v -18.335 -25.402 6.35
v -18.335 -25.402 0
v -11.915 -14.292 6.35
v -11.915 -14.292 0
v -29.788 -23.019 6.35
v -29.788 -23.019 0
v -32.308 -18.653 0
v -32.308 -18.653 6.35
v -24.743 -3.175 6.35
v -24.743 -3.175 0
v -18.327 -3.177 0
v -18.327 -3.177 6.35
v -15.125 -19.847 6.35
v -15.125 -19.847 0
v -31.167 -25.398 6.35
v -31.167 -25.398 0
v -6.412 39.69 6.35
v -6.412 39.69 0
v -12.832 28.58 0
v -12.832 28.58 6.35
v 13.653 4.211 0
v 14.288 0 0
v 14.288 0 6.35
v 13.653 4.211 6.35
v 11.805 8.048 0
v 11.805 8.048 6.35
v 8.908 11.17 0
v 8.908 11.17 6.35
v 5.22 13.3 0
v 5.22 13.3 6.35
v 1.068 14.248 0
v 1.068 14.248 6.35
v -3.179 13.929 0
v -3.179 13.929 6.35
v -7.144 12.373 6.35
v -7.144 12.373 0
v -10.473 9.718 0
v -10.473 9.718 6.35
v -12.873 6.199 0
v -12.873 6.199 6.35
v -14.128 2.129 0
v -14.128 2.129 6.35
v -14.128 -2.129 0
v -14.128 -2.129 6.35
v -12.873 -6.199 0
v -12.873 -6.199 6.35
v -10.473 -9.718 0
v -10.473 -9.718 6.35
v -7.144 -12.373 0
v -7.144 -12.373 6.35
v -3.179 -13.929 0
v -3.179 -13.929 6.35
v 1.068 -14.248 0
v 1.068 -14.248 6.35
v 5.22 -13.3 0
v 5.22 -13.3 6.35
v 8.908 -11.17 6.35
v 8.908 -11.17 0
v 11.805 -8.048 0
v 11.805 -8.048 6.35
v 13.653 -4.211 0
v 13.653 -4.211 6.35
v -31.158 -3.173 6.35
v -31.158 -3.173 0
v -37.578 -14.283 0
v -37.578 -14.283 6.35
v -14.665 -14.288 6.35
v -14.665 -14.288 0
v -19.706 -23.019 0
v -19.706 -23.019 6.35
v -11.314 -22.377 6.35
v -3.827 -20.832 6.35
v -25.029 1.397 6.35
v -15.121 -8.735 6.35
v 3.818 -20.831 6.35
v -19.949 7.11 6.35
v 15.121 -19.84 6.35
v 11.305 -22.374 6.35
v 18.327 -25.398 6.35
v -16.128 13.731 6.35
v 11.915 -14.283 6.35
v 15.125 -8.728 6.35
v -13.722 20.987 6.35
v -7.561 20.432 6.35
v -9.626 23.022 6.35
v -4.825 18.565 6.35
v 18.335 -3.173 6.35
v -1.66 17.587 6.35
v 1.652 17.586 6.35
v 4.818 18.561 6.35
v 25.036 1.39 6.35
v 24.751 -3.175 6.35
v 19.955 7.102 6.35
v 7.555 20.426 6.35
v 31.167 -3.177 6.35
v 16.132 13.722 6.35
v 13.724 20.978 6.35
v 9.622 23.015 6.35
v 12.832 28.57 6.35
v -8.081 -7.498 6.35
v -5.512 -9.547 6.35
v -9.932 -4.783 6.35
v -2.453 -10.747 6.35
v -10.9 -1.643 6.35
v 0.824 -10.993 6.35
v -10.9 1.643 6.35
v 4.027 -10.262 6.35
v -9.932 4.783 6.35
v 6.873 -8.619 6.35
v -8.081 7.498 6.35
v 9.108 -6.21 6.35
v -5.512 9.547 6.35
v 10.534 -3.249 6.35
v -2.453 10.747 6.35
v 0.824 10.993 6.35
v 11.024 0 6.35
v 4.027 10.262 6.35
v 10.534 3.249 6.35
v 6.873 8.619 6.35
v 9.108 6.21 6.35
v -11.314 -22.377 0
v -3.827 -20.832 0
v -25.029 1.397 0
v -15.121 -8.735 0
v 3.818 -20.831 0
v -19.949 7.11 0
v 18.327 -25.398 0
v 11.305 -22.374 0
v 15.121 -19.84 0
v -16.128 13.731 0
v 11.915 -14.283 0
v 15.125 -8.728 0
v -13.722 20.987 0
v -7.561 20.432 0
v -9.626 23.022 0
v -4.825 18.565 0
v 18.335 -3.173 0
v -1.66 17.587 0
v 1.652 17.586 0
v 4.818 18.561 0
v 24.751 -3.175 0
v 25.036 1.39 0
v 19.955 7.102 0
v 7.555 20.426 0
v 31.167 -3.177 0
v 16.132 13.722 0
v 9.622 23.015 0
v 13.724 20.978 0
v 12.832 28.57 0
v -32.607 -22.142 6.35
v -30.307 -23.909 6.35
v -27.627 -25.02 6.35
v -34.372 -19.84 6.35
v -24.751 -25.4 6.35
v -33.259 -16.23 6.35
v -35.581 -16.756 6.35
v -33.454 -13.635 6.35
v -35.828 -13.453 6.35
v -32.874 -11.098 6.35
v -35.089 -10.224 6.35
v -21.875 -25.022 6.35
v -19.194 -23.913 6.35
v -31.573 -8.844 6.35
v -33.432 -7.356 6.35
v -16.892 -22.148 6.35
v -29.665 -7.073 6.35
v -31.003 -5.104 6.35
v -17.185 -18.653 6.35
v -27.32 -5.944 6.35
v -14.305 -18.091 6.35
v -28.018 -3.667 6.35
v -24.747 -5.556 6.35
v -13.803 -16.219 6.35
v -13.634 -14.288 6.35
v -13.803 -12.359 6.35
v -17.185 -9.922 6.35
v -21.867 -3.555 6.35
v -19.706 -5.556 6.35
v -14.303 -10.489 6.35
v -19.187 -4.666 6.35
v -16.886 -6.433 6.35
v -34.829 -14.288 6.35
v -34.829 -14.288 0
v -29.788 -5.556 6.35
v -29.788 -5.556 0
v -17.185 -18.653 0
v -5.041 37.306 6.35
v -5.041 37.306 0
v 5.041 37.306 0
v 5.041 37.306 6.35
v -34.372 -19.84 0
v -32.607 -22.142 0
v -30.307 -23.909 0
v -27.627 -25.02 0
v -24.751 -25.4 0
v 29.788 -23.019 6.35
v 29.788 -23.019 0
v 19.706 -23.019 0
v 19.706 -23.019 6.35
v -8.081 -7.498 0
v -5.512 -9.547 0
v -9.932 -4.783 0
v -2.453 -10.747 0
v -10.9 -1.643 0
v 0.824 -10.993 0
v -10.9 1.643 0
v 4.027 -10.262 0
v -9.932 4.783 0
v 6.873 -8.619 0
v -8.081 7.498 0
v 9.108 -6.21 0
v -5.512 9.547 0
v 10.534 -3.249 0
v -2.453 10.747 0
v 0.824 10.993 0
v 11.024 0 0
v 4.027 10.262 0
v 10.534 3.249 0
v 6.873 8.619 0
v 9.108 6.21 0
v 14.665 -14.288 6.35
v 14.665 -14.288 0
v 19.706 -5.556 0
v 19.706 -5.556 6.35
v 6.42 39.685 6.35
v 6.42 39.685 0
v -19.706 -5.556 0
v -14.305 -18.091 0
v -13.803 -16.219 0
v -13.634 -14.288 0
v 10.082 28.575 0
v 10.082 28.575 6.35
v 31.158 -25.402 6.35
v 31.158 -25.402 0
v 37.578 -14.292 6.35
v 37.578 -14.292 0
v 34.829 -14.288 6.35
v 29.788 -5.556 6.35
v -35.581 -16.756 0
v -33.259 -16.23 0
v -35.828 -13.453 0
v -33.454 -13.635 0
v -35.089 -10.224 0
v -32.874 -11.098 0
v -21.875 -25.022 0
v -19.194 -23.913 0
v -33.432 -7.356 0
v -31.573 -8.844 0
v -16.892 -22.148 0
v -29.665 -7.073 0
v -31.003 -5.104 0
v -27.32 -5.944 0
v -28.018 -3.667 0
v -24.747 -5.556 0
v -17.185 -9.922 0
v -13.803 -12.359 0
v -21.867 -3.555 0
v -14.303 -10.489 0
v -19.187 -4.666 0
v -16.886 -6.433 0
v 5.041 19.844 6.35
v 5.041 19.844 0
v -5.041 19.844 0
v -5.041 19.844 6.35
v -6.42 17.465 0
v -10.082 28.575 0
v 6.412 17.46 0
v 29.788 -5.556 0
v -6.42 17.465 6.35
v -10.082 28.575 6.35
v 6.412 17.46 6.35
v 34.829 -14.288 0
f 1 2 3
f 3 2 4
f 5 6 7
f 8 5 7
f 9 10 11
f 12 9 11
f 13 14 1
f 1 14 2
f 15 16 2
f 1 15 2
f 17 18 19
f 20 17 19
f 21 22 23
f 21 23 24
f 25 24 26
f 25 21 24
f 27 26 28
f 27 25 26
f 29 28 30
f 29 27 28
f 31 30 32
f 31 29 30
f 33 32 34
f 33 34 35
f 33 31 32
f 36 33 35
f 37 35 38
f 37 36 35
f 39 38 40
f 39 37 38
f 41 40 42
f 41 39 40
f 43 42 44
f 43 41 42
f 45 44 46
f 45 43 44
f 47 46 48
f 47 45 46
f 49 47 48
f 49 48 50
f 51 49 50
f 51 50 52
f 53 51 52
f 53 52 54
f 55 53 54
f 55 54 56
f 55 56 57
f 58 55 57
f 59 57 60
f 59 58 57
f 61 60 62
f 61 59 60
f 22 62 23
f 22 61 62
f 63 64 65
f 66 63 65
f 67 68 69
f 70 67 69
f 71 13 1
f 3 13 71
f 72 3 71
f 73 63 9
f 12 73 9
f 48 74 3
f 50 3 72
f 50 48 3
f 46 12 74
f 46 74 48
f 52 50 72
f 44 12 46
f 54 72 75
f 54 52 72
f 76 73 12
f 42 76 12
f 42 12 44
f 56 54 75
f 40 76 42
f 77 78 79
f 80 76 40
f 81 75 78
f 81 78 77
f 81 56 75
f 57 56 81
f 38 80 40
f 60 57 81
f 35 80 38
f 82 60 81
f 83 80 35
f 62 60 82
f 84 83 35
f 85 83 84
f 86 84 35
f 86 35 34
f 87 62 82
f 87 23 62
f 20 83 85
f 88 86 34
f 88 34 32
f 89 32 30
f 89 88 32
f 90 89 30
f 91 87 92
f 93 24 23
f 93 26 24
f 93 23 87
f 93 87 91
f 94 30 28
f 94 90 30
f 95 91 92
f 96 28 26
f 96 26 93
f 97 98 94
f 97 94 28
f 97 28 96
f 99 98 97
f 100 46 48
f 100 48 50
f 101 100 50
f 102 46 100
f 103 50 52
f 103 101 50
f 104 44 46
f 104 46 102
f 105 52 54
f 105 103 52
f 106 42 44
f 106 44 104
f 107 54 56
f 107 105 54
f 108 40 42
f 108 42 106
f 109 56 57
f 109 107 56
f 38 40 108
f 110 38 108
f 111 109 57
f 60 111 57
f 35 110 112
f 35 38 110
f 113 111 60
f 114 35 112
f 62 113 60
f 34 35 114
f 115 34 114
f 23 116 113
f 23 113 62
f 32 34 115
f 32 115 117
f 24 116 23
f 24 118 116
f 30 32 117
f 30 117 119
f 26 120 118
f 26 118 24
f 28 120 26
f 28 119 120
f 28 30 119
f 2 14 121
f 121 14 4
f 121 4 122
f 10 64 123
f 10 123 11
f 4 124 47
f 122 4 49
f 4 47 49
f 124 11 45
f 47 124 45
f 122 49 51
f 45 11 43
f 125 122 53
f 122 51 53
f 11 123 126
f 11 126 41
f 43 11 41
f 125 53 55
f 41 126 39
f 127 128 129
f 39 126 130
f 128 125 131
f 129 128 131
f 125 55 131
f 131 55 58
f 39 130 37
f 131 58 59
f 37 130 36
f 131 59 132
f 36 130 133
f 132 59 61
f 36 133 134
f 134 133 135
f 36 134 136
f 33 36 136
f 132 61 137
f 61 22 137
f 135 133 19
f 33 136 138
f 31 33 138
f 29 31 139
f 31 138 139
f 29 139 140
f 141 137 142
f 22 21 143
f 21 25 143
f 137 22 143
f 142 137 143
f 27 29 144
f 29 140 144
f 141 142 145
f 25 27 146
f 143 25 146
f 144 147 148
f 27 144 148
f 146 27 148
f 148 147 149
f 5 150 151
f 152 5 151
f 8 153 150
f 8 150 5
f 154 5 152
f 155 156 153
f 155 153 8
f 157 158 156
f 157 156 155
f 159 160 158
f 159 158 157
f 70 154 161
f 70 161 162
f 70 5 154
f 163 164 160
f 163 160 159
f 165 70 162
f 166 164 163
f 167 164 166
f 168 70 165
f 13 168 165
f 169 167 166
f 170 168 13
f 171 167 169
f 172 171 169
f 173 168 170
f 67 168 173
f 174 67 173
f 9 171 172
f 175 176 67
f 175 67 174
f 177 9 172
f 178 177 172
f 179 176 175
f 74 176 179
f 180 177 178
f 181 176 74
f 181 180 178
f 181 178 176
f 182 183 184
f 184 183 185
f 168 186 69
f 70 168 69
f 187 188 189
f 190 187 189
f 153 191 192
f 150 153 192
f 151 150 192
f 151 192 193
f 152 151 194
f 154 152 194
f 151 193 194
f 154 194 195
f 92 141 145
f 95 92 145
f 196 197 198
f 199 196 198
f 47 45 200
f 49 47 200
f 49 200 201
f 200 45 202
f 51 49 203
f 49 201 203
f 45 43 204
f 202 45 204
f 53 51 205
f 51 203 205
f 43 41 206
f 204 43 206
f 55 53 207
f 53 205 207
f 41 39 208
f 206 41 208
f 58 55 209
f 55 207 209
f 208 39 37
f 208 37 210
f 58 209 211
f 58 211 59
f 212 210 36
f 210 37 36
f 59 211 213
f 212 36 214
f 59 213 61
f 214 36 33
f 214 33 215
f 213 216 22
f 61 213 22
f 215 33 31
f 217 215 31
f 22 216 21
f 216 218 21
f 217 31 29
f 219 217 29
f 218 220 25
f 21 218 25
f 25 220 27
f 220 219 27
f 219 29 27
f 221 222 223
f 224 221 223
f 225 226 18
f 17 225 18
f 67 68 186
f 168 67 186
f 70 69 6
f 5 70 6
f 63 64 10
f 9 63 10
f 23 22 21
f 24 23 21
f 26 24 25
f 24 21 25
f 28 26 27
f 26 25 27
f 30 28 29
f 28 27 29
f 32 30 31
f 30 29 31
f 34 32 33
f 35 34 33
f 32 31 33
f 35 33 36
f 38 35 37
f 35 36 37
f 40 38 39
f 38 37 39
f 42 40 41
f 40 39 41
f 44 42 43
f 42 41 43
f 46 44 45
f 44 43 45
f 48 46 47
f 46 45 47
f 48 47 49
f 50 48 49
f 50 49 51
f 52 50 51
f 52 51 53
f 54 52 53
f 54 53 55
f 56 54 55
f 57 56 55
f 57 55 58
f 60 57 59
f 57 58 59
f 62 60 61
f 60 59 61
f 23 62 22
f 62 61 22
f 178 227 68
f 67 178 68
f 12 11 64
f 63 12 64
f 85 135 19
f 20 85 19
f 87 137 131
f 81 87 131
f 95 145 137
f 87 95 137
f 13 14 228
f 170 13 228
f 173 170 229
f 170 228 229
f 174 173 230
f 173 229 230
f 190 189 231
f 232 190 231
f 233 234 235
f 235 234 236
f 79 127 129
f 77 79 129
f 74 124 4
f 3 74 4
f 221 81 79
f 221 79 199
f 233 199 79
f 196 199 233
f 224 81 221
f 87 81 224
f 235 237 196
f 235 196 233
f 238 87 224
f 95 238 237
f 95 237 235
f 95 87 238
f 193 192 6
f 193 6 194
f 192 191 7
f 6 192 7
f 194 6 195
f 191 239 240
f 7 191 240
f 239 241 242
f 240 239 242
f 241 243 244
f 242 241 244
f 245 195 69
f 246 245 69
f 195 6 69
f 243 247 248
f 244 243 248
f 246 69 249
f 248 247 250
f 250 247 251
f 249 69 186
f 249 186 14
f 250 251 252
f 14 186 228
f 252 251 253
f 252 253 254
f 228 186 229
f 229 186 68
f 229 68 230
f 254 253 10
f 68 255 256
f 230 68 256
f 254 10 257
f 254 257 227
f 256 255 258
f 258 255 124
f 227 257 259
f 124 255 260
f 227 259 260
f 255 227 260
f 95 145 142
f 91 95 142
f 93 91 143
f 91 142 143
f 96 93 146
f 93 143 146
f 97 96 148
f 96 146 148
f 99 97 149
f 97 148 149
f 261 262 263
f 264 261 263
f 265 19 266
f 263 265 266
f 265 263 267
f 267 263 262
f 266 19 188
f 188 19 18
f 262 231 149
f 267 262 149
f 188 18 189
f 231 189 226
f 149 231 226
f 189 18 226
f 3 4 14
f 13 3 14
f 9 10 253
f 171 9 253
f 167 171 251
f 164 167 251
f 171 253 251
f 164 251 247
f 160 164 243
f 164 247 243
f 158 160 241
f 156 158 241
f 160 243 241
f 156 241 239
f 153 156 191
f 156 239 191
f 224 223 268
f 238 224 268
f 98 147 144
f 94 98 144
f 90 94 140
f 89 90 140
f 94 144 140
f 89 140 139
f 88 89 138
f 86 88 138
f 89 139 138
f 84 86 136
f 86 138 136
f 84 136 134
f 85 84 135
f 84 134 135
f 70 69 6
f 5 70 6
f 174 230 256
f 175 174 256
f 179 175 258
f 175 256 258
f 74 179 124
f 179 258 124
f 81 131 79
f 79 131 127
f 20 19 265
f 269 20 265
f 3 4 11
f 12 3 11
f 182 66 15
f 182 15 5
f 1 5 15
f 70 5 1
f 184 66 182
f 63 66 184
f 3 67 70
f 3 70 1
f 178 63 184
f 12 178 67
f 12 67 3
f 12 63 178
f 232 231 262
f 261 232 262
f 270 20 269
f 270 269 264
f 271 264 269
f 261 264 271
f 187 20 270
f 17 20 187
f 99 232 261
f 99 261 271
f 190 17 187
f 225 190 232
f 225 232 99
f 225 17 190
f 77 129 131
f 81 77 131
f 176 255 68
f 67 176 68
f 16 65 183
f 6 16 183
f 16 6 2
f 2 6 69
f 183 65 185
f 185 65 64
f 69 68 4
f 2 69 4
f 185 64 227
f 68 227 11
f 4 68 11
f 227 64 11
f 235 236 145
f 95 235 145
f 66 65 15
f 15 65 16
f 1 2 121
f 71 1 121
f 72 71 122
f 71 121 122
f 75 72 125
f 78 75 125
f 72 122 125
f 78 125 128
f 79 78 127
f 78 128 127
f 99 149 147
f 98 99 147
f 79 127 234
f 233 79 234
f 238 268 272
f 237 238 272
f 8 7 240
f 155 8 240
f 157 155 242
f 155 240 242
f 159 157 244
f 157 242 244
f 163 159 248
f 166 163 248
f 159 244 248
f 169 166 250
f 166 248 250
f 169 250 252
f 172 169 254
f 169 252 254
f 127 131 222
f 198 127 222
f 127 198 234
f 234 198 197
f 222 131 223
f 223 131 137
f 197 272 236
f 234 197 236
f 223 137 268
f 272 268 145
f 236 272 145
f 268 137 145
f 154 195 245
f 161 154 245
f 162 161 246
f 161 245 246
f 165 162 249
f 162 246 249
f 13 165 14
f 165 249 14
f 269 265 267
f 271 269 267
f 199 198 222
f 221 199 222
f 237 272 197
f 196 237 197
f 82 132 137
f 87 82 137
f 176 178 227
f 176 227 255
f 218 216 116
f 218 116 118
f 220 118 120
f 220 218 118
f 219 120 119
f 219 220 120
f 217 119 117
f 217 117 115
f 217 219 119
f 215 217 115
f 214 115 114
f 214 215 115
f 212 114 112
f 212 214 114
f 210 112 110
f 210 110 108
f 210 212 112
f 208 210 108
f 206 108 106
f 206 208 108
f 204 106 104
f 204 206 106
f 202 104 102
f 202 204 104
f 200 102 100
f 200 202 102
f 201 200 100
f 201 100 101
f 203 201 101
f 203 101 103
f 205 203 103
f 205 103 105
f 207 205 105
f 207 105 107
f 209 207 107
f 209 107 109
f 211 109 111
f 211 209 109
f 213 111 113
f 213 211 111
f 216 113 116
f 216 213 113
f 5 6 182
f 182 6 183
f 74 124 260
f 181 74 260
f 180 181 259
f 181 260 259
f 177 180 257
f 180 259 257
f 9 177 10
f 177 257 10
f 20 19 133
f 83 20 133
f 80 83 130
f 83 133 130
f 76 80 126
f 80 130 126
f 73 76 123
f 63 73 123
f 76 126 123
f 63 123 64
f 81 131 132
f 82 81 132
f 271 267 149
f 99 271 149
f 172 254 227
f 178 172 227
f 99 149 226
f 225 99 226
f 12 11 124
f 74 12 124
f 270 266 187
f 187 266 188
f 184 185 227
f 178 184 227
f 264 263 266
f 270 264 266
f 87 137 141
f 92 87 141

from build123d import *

# Parameters (mm, degrees)
F1_R     = 14.2875
F2_DEPTH = 6.35
F0_R     = 14.2875
F0_R_2   = 11.0236


with BuildPart() as f2:
    # F1 (on Top) → F2 (new body)
    with BuildSketch(Plane.XY):
        with BuildLine():
            Line((-9.6257781888, 23.0223384301), (-12.8316088413, 28.579783006))
            ThreePointArc((-12.8316088413, 28.579783006), (-17.8702177803, 10.3228755027), (-31.158338129, -3.172609269))
            Line((-31.158338129, -3.172609269), (-24.7425337308, -3.175000772))
            Line((-24.7425337308, -3.175000772), (-18.3267292877, -3.177392275))
            Line((-18.3267292877, -3.177392275), (-15.120897628, -8.7348385972))
            Line((-15.120897628, -8.7348385972), (-11.9150670718, -14.292283006))
            Line((-11.9150670718, -14.292283006), (-15.1250400311, -19.8473362568))
            Line((-15.1250400311, -19.8473362568), (-18.3350136972, -25.402390731))
            ThreePointArc((-18.3350136972, -25.402390731), (-0.0047635353, -20.6375003203), (18.3267292877, -25.397607725))
            Line((18.3267292877, -25.397607725), (15.120897642, -19.8401614272))
            Line((15.120897642, -19.8401614272), (11.9150670718, -14.282716994))
            Line((11.9150670718, -14.282716994), (15.1250401794, -8.7276634864))
            Line((15.1250401794, -8.7276634864), (18.3350136972, -3.172609269))
            Line((18.3350136972, -3.172609269), (24.7508187743, -3.1750007723))
            Line((24.7508187743, -3.1750007723), (31.1666225385, -3.177392275))
            ThreePointArc((31.1666225385, -3.177392275), (17.8749813156, 10.3146248176), (12.8316088413, 28.570216994))
            Line((12.8316088413, 28.570216994), (9.6216358038, 23.0151636077))
            ThreePointArc((9.6216358038, 23.0151636077), (-0.0041423855, 17.4625007721), (-9.6257781888, 23.0223384301))
        make_face()
        Circle(F1_R, mode=Mode.SUBTRACT)
    extrude(amount=F2_DEPTH)


with BuildPart() as f2b:
    # F1 (on Top) → F2, piece 2 (new body)
    with BuildSketch(Plane.XY):
        with BuildLine():
            ThreePointArc((-15.120897628, -8.7348385972), (-19.1868385762, -4.6658647421), (-24.7425337308, -3.175000772))
            ThreePointArc((-24.7425337308, -3.175000772), (-34.3683112264, -8.7276627587), (-34.3724540879, -19.8401615943))
            ThreePointArc((-34.3724540879, -19.8401615943), (-30.3065133789, -23.9091351835), (-24.7508186141, -25.3999992278))
            ThreePointArc((-24.7508186141, -25.3999992278), (-19.1940134626, -23.9132776808), (-15.1250400311, -19.8473362568))
            ThreePointArc((-15.1250400311, -19.8473362568), (-14.0133613042, -17.1656267789), (-13.6341759131, -14.2875))
            ThreePointArc((-13.6341759131, -14.2875), (-14.0122891714, -11.413374476), (-15.120897628, -8.7348385972))
        make_face()
        with BuildLine():
            Line((-17.1851915093, -9.921875168), (-14.6646968374, -14.2875))
            Line((-14.6646968374, -14.2875), (-17.1851916335, -18.6531250471))
            Line((-17.1851916335, -18.6531250471), (-19.7056863753, -23.01875))
            Line((-19.7056863753, -23.01875), (-24.7466759131, -23.01875))
            Line((-24.7466759131, -23.01875), (-29.787665451, -23.01875))
            Line((-29.787665451, -23.01875), (-32.3081602983, -18.6531248642))
            ThreePointArc((-32.3081602983, -18.6531248642), (-32.3081601807, -9.9218749321), (-24.7466759131, -5.55625))
            Line((-24.7466759131, -5.55625), (-19.7056863753, -5.55625))
            Line((-19.7056863753, -5.55625), (-17.1851915093, -9.921875168))
        make_face(mode=Mode.SUBTRACT)
    extrude(amount=F2_DEPTH)


with BuildPart() as f2c:
    # F0 (on Top) → F2, piece 3 (new body)
    with BuildSketch(Plane.XY):
        Polygon((12.8316088413, 28.570216994), (6.4199466254, 39.685107725), (-6.4116622159, 39.689890731), (-12.8316088413, 28.579783006), (-6.4199466254, 17.464892275), (6.4116622159, 17.460109269), align=None)
        Polygon((10.0819790757, 28.575), (5.0409895379, 19.84375), (-5.0409895379, 19.84375), (-10.0819790757, 28.575), (-5.0409895379, 37.30625), (5.0409895379, 37.30625), align=None, mode=Mode.SUBTRACT)
    extrude(amount=F2_DEPTH)


with BuildPart() as f2d:
    # F0 (on Top) → F2, piece 4 (new body)
    with BuildSketch(Plane.XY):
        Circle(F0_R)
        Circle(F0_R_2, mode=Mode.SUBTRACT)
    extrude(amount=F2_DEPTH)


with BuildPart() as f2e:
    # F0 (on Top) → F2, piece 5 (new body)
    with BuildSketch(Plane.XY):
        Polygon((31.1666225385, -3.177392275), (18.3350136972, -3.172609269), (11.9150670718, -14.282716994), (18.3267292877, -25.397607725), (31.158338129, -25.402390731), (37.5782847544, -14.292283006), align=None)
        Polygon((19.7056863753, -23.01875), (14.6646968374, -14.2875), (19.7056863753, -5.55625), (29.787665451, -5.55625), (34.8286549889, -14.2875), (29.787665451, -23.01875), align=None, mode=Mode.SUBTRACT)
    extrude(amount=F2_DEPTH)


with BuildPart() as f2f:
    # F0 (on Top) → F2, piece 6 (new body)
    with BuildSketch(Plane.XY):
        Polygon((-18.3350136972, -25.402390731), (-11.9150670718, -14.292283006), (-18.3267292877, -3.177392275), (-31.158338129, -3.172609269), (-37.5782847544, -14.282716994), (-31.1666225385, -25.397607725), align=None)
        Polygon((-29.787665451, -5.55625), (-19.7056863753, -5.55625), (-14.6646968374, -14.2875), (-19.7056863753, -23.01875), (-29.787665451, -23.01875), (-34.8286549889, -14.2875), align=None, mode=Mode.SUBTRACT)
    extrude(amount=F2_DEPTH)


solid = Compound([f2.part, f2b.part, f2c.part, f2d.part, f2e.part, f2f.part])
